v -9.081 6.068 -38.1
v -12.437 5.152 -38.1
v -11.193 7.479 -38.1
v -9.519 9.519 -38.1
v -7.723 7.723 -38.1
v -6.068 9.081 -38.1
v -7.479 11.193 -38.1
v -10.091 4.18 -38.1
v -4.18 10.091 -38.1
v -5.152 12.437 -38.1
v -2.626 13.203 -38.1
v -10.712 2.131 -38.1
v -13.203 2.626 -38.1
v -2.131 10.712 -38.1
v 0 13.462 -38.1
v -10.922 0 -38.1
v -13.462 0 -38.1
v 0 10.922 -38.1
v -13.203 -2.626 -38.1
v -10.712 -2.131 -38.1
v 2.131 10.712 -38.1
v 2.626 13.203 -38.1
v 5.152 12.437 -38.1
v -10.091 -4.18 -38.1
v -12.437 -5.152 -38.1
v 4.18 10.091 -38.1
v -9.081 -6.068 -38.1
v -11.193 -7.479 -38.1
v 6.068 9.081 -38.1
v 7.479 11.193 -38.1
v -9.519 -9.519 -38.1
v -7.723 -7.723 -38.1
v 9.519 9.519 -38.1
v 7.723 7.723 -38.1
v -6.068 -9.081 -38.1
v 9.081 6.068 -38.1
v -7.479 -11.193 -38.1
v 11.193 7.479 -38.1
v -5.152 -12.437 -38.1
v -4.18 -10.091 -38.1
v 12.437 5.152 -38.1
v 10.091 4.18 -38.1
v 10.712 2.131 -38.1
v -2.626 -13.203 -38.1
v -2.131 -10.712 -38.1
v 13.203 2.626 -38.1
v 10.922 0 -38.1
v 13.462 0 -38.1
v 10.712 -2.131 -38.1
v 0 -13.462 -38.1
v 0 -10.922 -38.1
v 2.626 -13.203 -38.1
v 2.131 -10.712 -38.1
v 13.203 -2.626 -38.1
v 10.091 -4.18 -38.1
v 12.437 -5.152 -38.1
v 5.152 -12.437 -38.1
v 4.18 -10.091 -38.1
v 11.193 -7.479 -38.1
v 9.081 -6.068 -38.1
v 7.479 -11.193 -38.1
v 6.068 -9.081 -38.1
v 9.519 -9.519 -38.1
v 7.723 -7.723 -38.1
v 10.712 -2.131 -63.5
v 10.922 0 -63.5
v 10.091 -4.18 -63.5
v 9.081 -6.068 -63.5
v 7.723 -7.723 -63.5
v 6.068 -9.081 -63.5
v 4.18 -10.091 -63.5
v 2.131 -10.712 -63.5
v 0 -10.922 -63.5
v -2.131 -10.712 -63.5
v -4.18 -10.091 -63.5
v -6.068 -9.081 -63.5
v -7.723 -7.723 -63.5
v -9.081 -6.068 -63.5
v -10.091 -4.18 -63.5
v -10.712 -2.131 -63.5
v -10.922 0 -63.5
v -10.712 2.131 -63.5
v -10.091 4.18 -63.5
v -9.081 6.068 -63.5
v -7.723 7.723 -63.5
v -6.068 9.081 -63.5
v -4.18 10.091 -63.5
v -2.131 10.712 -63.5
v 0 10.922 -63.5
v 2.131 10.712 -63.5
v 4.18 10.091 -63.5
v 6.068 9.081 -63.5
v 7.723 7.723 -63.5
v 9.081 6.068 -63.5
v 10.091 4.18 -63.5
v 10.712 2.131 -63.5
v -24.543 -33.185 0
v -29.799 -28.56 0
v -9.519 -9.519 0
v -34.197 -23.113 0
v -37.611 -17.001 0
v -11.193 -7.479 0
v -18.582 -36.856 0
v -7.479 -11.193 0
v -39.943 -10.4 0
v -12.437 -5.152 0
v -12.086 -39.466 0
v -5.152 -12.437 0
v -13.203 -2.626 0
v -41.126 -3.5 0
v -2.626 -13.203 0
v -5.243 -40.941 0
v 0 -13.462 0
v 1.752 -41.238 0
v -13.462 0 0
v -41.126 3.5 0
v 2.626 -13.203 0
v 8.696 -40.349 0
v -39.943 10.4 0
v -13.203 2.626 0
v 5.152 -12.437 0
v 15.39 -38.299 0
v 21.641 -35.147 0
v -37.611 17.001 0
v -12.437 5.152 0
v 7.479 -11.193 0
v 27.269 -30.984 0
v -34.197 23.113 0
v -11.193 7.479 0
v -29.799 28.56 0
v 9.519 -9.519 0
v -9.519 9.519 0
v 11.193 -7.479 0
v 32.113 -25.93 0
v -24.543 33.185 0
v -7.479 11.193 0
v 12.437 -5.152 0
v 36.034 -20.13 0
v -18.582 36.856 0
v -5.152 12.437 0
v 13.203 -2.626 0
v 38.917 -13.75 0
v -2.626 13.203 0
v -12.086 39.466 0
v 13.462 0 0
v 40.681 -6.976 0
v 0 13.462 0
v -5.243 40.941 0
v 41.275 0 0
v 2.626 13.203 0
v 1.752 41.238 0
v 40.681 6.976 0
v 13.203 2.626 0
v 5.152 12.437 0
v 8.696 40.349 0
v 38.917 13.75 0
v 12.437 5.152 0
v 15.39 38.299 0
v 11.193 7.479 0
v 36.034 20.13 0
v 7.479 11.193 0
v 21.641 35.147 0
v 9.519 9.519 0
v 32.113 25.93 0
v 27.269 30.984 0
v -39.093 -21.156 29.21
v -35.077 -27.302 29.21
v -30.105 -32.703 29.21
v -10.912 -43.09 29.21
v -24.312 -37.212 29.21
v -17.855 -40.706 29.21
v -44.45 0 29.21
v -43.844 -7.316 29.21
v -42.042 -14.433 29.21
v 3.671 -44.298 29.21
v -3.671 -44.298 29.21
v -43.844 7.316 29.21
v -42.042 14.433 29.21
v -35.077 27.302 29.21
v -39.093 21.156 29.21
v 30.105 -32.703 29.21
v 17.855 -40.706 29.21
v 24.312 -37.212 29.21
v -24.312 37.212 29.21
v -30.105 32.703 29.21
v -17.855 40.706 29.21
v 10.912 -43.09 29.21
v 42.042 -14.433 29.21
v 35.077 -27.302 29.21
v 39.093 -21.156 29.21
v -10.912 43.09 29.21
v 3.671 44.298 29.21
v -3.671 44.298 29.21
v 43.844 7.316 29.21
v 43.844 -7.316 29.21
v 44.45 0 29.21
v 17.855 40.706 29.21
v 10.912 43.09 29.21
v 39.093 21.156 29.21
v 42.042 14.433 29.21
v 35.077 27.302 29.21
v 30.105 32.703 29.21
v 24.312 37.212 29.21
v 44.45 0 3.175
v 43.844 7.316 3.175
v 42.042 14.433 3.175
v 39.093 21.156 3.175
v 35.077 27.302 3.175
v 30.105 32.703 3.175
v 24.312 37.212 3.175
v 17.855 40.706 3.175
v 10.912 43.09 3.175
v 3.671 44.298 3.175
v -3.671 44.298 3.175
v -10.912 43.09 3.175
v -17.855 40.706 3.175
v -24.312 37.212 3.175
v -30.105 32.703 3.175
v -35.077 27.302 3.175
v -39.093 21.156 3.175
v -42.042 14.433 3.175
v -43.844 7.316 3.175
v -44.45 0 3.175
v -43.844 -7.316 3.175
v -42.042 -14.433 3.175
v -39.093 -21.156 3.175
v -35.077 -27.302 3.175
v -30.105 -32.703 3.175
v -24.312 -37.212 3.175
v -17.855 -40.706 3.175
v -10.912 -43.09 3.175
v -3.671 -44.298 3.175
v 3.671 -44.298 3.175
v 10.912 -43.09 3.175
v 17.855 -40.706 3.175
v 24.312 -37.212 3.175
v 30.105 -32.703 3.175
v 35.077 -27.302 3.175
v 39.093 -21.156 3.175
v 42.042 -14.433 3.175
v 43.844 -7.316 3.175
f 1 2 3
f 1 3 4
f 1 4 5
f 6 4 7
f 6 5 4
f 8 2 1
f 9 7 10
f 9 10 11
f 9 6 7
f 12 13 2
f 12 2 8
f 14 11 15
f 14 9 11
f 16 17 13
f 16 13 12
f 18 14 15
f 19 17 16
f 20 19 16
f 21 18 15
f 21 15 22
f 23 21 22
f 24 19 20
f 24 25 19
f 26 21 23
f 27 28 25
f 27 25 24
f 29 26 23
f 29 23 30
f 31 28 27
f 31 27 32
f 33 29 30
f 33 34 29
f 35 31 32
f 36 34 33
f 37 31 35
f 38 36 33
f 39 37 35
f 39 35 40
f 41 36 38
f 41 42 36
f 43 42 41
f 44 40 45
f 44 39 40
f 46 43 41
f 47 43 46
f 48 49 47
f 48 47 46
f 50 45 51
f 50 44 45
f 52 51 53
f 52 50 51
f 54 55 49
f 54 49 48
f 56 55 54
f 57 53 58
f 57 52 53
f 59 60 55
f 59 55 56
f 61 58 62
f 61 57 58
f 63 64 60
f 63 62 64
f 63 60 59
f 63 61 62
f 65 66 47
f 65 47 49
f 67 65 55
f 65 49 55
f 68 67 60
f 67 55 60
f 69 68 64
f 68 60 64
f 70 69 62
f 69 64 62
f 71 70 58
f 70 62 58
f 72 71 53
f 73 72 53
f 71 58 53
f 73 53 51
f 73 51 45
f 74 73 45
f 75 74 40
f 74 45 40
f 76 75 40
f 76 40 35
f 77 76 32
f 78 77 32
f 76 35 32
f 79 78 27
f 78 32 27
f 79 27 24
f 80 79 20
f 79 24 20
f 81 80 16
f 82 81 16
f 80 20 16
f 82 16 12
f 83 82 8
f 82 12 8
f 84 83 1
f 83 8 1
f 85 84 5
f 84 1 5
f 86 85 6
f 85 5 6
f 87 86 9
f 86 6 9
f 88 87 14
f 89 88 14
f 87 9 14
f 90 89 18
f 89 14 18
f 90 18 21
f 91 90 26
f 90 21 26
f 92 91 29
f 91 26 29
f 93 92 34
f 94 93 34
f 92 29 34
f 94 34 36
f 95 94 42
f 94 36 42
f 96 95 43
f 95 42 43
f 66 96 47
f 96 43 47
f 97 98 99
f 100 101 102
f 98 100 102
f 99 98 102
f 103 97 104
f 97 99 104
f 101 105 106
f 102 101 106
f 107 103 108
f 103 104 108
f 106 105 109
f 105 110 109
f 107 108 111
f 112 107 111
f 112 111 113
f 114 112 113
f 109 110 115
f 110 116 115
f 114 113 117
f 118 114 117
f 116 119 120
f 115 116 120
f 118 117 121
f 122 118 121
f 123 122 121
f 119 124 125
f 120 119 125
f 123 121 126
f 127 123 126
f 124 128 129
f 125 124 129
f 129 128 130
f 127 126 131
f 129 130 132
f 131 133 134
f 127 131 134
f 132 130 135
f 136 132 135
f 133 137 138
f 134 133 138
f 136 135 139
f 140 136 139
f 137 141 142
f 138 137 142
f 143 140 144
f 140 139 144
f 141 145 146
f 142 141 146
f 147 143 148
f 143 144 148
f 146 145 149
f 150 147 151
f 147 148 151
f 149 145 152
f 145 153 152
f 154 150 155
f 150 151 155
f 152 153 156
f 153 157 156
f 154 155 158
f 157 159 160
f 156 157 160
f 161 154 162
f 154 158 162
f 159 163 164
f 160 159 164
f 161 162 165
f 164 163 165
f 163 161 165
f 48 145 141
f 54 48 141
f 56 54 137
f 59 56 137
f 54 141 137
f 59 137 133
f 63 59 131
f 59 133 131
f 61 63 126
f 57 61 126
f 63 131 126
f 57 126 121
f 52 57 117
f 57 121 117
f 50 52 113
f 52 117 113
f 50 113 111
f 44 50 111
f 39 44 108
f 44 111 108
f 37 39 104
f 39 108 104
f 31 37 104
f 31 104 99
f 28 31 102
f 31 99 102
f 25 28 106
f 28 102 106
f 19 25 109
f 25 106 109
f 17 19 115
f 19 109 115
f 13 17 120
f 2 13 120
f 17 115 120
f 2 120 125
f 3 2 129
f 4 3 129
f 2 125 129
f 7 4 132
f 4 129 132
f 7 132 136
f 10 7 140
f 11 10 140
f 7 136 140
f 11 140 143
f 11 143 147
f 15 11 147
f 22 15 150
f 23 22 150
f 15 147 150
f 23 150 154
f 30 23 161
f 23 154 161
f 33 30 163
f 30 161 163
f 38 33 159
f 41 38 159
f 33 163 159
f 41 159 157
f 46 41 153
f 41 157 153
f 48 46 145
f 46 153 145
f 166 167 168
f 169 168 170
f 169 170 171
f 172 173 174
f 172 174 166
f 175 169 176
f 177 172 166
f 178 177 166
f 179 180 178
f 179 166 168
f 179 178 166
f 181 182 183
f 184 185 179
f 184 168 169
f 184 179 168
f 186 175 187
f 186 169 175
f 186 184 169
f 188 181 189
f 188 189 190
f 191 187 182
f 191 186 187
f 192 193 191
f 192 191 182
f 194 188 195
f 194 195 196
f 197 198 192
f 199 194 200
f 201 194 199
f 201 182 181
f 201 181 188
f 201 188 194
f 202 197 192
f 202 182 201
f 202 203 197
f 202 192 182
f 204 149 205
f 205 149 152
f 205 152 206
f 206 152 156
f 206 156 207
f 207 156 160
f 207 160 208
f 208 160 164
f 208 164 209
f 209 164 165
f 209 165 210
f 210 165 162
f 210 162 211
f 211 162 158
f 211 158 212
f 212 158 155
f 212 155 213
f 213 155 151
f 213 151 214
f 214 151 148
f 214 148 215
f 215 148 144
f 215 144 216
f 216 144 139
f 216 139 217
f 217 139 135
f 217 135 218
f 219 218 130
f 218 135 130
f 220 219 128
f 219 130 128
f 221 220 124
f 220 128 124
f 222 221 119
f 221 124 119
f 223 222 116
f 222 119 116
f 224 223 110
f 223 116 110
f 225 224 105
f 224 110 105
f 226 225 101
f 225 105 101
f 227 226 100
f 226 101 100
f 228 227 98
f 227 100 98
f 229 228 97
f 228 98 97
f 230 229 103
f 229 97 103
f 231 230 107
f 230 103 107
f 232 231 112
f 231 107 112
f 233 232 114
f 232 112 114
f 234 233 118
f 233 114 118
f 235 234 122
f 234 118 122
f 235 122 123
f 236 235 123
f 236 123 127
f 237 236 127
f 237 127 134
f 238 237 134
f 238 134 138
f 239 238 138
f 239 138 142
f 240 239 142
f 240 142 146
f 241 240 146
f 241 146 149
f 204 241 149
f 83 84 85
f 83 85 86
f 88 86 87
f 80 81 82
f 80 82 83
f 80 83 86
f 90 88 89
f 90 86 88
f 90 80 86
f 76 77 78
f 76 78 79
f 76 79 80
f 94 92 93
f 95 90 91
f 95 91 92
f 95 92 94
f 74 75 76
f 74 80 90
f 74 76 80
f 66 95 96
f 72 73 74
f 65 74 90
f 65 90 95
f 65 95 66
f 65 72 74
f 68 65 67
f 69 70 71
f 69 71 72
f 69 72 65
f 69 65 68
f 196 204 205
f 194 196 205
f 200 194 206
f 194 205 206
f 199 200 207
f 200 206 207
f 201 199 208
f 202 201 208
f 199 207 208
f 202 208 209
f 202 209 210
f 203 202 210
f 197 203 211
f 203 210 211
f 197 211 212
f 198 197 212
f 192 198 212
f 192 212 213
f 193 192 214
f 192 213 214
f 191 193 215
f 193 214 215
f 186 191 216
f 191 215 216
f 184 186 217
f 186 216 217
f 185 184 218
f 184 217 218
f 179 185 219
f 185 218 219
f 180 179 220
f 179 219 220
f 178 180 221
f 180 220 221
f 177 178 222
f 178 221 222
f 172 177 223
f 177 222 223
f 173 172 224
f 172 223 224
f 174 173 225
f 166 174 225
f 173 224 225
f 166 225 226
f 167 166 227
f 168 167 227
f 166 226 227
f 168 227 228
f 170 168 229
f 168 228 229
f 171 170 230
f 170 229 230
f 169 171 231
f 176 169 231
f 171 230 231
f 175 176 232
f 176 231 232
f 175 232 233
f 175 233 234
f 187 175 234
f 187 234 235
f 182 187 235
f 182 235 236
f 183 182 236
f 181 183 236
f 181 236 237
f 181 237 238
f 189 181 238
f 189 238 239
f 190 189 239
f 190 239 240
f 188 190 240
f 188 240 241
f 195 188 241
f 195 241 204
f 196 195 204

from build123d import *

# Parameters (mm, degrees)
F0_R     = 44.45
F1_DEPTH = 29.21
F2_SIZE  = 3.175
F3_R     = 13.462
F4_DEPTH = 38.1
F5_R     = 10.922
F6_DEPTH = 25.4


with BuildPart() as f1:
    # F0 (on Top) → F1 (new body)
    with BuildSketch(Plane.XY):
        Circle(F0_R)
    extrude(amount=F1_DEPTH)

    # F2
    f2_edges = [f1.edges().sort_by_distance(p)[0] for p in [
        (-44.45, 0, 0),
    ]]
    chamfer(f2_edges, length=F2_SIZE)

    # F3 (on face) → F4 (join)
    with BuildSketch(Plane(origin=(0, 0, 0), x_dir=(1, 0, 0), z_dir=(0, 0, -1))):
        Circle(F3_R)
    extrude(amount=F4_DEPTH)

    # F5 (on face) → F6 (join)
    with BuildSketch(Plane(origin=(0, 0, -38.1), x_dir=(1, 0, 0), z_dir=(0, 0, -1))):
        Circle(F5_R)
    extrude(amount=F6_DEPTH)


solid = f1.part
